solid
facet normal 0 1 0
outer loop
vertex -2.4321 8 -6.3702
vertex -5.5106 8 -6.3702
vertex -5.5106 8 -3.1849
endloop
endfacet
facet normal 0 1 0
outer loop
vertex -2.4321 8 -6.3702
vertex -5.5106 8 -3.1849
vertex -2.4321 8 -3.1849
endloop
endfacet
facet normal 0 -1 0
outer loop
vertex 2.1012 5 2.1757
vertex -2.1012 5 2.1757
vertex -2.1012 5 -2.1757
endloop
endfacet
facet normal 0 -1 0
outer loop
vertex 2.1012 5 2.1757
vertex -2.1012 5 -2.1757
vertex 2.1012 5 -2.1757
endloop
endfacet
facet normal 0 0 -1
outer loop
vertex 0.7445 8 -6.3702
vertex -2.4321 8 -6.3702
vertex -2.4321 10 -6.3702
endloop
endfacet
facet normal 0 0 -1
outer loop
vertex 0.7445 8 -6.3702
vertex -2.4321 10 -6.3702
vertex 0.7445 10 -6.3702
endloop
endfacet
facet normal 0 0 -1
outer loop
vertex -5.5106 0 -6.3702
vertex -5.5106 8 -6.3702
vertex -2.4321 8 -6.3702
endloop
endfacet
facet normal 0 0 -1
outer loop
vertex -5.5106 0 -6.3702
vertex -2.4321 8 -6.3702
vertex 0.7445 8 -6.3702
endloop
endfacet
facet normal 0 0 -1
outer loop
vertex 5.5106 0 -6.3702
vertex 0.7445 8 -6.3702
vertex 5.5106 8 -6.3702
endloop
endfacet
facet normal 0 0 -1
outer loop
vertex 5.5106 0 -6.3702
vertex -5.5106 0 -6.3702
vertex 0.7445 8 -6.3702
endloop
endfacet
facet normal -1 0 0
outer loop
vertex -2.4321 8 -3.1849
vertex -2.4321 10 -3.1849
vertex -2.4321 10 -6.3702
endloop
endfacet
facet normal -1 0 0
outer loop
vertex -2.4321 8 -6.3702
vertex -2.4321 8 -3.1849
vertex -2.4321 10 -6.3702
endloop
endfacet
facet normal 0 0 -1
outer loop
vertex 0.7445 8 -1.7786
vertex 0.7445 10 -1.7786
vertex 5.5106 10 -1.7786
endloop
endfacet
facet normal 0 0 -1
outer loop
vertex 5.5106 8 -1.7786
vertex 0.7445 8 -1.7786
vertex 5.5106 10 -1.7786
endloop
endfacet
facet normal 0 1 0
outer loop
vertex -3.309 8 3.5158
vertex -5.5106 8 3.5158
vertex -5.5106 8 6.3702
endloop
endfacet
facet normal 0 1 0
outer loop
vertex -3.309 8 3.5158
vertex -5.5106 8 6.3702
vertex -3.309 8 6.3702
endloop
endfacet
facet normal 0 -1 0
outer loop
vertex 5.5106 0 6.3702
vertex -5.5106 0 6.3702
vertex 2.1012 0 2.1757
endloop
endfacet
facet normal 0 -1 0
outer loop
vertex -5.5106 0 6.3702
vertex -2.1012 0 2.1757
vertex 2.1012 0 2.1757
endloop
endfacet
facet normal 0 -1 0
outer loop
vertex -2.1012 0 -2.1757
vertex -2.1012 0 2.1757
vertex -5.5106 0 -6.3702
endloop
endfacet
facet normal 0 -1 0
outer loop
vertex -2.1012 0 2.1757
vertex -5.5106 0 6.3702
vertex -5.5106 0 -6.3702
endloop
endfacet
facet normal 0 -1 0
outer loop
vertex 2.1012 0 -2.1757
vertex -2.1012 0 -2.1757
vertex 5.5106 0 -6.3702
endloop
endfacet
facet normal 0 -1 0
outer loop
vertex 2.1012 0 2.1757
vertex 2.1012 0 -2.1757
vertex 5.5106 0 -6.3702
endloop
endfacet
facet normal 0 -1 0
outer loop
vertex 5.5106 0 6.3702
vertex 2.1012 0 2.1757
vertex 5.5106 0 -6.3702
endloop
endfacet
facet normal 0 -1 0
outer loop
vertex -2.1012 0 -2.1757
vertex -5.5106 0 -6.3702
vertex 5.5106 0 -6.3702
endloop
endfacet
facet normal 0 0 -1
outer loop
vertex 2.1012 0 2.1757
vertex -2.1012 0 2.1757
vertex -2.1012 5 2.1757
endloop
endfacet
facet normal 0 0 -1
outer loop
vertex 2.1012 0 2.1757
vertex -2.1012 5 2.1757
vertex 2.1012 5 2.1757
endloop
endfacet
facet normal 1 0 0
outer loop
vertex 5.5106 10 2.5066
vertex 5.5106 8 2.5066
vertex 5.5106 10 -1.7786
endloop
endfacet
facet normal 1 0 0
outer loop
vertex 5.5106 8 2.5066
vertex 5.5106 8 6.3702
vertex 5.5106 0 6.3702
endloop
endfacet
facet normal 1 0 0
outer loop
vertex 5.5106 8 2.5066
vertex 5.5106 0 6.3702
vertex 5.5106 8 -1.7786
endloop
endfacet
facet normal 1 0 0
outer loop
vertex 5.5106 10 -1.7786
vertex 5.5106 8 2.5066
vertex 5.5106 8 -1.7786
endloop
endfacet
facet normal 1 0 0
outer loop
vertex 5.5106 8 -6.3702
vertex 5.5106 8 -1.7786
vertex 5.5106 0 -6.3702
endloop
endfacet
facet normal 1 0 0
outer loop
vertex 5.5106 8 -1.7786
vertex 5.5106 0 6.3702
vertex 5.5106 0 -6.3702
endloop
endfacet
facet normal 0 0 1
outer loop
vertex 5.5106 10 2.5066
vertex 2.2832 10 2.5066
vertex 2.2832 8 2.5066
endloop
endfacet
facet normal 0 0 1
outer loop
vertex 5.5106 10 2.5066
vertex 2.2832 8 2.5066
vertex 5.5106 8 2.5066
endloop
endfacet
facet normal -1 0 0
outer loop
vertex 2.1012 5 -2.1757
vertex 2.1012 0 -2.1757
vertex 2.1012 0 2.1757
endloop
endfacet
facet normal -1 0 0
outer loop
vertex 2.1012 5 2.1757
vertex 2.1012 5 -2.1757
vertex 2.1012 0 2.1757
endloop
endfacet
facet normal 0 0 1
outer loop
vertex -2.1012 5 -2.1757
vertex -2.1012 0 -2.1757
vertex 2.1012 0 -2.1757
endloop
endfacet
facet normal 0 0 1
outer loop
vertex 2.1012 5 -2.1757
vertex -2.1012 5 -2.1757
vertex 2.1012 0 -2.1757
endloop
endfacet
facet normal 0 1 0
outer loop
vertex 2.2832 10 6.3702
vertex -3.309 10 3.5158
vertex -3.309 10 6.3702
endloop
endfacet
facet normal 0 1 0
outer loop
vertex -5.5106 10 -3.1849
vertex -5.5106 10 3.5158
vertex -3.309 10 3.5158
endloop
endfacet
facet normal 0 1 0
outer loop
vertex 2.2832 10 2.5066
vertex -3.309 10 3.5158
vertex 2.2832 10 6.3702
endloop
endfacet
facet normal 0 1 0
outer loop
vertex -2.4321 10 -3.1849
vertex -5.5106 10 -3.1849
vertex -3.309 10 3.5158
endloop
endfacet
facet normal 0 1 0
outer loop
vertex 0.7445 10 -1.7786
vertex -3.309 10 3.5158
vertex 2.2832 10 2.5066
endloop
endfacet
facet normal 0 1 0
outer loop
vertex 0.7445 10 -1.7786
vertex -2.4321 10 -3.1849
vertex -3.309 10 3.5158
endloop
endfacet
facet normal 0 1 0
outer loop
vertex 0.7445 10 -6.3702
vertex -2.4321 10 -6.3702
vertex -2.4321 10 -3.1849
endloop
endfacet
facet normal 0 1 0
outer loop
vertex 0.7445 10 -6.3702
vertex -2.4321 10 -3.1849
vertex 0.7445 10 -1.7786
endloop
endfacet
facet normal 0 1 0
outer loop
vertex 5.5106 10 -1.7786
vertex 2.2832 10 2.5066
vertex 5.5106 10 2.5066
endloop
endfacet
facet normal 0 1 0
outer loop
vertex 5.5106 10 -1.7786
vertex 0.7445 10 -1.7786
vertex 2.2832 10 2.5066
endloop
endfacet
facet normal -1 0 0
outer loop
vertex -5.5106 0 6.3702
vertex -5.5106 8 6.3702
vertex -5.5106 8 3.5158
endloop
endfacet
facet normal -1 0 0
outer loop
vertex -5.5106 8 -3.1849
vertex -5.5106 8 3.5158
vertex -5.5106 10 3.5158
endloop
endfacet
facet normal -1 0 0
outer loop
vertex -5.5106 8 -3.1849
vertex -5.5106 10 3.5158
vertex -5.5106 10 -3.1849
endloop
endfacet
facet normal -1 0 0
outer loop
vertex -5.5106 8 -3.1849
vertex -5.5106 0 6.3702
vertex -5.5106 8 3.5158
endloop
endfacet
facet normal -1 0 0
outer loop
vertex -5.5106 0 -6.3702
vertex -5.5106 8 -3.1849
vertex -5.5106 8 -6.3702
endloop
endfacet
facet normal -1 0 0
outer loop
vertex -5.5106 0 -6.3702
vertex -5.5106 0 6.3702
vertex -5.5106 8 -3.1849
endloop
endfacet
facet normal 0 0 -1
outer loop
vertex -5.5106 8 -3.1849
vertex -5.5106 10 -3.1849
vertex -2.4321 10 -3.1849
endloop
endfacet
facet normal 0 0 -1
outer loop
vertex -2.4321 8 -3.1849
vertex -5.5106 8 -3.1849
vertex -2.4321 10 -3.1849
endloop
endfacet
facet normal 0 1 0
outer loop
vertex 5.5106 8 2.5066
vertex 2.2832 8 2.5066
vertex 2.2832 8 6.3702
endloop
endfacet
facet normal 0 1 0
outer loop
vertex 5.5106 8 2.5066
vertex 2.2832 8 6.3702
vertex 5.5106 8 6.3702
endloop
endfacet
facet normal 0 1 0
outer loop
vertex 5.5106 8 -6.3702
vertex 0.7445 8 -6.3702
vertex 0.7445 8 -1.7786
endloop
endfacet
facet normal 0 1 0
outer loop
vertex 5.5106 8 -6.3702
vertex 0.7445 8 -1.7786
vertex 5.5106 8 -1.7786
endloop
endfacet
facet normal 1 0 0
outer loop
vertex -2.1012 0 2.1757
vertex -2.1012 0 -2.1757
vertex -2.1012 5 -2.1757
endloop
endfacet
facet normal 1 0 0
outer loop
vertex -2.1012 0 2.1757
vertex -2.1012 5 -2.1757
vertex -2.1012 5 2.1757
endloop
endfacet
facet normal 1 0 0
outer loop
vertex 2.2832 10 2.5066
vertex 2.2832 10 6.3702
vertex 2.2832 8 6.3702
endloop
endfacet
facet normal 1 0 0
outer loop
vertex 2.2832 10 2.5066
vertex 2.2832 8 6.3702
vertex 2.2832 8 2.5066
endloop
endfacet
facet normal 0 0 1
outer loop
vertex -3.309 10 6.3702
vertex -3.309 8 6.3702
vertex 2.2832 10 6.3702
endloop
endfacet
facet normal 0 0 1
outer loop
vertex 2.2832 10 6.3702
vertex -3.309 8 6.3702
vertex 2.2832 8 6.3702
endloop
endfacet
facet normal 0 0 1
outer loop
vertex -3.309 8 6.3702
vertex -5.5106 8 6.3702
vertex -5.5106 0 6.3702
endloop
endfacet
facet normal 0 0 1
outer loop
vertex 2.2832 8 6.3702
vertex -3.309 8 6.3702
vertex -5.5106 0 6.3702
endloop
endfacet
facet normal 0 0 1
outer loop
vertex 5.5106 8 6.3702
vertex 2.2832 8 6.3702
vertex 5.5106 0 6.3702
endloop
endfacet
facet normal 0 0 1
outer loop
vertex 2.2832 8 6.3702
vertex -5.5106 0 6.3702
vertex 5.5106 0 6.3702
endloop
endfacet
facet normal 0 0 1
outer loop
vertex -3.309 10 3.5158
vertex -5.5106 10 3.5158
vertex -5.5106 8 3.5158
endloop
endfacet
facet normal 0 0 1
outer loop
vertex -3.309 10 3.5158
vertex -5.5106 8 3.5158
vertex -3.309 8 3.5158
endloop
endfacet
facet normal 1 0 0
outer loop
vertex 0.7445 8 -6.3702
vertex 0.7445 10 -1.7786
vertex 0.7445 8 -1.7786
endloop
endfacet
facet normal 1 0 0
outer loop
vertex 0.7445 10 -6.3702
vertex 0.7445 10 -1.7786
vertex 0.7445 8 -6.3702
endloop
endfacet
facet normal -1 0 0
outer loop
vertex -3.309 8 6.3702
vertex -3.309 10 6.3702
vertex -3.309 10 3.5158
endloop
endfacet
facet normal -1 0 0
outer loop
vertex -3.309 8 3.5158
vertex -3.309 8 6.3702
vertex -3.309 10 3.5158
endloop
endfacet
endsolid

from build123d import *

# Parameters (mm, degrees)
SKETCH1_W           = 11.021234102
SKETCH1_H           = 12.740456306
BOSS_EXTRUDE1_DEPTH = 10
SKETCH2_W           = 2.201611783
SKETCH2_H           = 2.854410055
SKETCH2_W_2         = 3.227403416
SKETCH2_H_2         = 3.863656662
SKETCH2_W_3         = 3.078498179
SKETCH2_H_3         = 3.185310582
SKETCH2_W_4         = 4.766090866
SKETCH2_H_4         = 4.591637821
CUT_EXTRUDE1_DEPTH  = 2
SKETCH3_W           = 4.20243669
SKETCH3_H           = 4.351341928
CUT_EXTRUDE2_DEPTH  = 5


with BuildPart() as part:
    # Sketch1 → Boss-Extrude1 (new body)
    with BuildSketch(Plane(origin=(0, 0, 0), x_dir=(1, 0, 0), z_dir=(0, 1, 0))):
        Rectangle(SKETCH1_W, SKETCH1_H)
    extrude(amount=BOSS_EXTRUDE1_DEPTH)

    # Sketch2 → Cut-Extrude1 (cut)
    with BuildSketch(Plane(origin=(0, 10, 0), x_dir=(1, 0, 0), z_dir=(0, 1, 0))):
        with Locations((-4.40981116, -4.943023125)):
            Rectangle(SKETCH2_W, SKETCH2_H)
        with Locations((3.896915343, -4.438399822)):
            Rectangle(SKETCH2_W_2, SKETCH2_H_2)
        with Locations((-3.971367962, 4.777572862)):
            Rectangle(SKETCH2_W_3, SKETCH2_H_3)
        with Locations((3.127571618, 4.074409242)):
            Rectangle(SKETCH2_W_4, SKETCH2_H_4)
    extrude(amount=-CUT_EXTRUDE1_DEPTH, mode=Mode.SUBTRACT)

    # Sketch3 → Cut-Extrude2 (cut)
    with BuildSketch(Plane.XZ):
        Rectangle(SKETCH3_W, SKETCH3_H)
    extrude(amount=-CUT_EXTRUDE2_DEPTH, mode=Mode.SUBTRACT)


solid = part.part
